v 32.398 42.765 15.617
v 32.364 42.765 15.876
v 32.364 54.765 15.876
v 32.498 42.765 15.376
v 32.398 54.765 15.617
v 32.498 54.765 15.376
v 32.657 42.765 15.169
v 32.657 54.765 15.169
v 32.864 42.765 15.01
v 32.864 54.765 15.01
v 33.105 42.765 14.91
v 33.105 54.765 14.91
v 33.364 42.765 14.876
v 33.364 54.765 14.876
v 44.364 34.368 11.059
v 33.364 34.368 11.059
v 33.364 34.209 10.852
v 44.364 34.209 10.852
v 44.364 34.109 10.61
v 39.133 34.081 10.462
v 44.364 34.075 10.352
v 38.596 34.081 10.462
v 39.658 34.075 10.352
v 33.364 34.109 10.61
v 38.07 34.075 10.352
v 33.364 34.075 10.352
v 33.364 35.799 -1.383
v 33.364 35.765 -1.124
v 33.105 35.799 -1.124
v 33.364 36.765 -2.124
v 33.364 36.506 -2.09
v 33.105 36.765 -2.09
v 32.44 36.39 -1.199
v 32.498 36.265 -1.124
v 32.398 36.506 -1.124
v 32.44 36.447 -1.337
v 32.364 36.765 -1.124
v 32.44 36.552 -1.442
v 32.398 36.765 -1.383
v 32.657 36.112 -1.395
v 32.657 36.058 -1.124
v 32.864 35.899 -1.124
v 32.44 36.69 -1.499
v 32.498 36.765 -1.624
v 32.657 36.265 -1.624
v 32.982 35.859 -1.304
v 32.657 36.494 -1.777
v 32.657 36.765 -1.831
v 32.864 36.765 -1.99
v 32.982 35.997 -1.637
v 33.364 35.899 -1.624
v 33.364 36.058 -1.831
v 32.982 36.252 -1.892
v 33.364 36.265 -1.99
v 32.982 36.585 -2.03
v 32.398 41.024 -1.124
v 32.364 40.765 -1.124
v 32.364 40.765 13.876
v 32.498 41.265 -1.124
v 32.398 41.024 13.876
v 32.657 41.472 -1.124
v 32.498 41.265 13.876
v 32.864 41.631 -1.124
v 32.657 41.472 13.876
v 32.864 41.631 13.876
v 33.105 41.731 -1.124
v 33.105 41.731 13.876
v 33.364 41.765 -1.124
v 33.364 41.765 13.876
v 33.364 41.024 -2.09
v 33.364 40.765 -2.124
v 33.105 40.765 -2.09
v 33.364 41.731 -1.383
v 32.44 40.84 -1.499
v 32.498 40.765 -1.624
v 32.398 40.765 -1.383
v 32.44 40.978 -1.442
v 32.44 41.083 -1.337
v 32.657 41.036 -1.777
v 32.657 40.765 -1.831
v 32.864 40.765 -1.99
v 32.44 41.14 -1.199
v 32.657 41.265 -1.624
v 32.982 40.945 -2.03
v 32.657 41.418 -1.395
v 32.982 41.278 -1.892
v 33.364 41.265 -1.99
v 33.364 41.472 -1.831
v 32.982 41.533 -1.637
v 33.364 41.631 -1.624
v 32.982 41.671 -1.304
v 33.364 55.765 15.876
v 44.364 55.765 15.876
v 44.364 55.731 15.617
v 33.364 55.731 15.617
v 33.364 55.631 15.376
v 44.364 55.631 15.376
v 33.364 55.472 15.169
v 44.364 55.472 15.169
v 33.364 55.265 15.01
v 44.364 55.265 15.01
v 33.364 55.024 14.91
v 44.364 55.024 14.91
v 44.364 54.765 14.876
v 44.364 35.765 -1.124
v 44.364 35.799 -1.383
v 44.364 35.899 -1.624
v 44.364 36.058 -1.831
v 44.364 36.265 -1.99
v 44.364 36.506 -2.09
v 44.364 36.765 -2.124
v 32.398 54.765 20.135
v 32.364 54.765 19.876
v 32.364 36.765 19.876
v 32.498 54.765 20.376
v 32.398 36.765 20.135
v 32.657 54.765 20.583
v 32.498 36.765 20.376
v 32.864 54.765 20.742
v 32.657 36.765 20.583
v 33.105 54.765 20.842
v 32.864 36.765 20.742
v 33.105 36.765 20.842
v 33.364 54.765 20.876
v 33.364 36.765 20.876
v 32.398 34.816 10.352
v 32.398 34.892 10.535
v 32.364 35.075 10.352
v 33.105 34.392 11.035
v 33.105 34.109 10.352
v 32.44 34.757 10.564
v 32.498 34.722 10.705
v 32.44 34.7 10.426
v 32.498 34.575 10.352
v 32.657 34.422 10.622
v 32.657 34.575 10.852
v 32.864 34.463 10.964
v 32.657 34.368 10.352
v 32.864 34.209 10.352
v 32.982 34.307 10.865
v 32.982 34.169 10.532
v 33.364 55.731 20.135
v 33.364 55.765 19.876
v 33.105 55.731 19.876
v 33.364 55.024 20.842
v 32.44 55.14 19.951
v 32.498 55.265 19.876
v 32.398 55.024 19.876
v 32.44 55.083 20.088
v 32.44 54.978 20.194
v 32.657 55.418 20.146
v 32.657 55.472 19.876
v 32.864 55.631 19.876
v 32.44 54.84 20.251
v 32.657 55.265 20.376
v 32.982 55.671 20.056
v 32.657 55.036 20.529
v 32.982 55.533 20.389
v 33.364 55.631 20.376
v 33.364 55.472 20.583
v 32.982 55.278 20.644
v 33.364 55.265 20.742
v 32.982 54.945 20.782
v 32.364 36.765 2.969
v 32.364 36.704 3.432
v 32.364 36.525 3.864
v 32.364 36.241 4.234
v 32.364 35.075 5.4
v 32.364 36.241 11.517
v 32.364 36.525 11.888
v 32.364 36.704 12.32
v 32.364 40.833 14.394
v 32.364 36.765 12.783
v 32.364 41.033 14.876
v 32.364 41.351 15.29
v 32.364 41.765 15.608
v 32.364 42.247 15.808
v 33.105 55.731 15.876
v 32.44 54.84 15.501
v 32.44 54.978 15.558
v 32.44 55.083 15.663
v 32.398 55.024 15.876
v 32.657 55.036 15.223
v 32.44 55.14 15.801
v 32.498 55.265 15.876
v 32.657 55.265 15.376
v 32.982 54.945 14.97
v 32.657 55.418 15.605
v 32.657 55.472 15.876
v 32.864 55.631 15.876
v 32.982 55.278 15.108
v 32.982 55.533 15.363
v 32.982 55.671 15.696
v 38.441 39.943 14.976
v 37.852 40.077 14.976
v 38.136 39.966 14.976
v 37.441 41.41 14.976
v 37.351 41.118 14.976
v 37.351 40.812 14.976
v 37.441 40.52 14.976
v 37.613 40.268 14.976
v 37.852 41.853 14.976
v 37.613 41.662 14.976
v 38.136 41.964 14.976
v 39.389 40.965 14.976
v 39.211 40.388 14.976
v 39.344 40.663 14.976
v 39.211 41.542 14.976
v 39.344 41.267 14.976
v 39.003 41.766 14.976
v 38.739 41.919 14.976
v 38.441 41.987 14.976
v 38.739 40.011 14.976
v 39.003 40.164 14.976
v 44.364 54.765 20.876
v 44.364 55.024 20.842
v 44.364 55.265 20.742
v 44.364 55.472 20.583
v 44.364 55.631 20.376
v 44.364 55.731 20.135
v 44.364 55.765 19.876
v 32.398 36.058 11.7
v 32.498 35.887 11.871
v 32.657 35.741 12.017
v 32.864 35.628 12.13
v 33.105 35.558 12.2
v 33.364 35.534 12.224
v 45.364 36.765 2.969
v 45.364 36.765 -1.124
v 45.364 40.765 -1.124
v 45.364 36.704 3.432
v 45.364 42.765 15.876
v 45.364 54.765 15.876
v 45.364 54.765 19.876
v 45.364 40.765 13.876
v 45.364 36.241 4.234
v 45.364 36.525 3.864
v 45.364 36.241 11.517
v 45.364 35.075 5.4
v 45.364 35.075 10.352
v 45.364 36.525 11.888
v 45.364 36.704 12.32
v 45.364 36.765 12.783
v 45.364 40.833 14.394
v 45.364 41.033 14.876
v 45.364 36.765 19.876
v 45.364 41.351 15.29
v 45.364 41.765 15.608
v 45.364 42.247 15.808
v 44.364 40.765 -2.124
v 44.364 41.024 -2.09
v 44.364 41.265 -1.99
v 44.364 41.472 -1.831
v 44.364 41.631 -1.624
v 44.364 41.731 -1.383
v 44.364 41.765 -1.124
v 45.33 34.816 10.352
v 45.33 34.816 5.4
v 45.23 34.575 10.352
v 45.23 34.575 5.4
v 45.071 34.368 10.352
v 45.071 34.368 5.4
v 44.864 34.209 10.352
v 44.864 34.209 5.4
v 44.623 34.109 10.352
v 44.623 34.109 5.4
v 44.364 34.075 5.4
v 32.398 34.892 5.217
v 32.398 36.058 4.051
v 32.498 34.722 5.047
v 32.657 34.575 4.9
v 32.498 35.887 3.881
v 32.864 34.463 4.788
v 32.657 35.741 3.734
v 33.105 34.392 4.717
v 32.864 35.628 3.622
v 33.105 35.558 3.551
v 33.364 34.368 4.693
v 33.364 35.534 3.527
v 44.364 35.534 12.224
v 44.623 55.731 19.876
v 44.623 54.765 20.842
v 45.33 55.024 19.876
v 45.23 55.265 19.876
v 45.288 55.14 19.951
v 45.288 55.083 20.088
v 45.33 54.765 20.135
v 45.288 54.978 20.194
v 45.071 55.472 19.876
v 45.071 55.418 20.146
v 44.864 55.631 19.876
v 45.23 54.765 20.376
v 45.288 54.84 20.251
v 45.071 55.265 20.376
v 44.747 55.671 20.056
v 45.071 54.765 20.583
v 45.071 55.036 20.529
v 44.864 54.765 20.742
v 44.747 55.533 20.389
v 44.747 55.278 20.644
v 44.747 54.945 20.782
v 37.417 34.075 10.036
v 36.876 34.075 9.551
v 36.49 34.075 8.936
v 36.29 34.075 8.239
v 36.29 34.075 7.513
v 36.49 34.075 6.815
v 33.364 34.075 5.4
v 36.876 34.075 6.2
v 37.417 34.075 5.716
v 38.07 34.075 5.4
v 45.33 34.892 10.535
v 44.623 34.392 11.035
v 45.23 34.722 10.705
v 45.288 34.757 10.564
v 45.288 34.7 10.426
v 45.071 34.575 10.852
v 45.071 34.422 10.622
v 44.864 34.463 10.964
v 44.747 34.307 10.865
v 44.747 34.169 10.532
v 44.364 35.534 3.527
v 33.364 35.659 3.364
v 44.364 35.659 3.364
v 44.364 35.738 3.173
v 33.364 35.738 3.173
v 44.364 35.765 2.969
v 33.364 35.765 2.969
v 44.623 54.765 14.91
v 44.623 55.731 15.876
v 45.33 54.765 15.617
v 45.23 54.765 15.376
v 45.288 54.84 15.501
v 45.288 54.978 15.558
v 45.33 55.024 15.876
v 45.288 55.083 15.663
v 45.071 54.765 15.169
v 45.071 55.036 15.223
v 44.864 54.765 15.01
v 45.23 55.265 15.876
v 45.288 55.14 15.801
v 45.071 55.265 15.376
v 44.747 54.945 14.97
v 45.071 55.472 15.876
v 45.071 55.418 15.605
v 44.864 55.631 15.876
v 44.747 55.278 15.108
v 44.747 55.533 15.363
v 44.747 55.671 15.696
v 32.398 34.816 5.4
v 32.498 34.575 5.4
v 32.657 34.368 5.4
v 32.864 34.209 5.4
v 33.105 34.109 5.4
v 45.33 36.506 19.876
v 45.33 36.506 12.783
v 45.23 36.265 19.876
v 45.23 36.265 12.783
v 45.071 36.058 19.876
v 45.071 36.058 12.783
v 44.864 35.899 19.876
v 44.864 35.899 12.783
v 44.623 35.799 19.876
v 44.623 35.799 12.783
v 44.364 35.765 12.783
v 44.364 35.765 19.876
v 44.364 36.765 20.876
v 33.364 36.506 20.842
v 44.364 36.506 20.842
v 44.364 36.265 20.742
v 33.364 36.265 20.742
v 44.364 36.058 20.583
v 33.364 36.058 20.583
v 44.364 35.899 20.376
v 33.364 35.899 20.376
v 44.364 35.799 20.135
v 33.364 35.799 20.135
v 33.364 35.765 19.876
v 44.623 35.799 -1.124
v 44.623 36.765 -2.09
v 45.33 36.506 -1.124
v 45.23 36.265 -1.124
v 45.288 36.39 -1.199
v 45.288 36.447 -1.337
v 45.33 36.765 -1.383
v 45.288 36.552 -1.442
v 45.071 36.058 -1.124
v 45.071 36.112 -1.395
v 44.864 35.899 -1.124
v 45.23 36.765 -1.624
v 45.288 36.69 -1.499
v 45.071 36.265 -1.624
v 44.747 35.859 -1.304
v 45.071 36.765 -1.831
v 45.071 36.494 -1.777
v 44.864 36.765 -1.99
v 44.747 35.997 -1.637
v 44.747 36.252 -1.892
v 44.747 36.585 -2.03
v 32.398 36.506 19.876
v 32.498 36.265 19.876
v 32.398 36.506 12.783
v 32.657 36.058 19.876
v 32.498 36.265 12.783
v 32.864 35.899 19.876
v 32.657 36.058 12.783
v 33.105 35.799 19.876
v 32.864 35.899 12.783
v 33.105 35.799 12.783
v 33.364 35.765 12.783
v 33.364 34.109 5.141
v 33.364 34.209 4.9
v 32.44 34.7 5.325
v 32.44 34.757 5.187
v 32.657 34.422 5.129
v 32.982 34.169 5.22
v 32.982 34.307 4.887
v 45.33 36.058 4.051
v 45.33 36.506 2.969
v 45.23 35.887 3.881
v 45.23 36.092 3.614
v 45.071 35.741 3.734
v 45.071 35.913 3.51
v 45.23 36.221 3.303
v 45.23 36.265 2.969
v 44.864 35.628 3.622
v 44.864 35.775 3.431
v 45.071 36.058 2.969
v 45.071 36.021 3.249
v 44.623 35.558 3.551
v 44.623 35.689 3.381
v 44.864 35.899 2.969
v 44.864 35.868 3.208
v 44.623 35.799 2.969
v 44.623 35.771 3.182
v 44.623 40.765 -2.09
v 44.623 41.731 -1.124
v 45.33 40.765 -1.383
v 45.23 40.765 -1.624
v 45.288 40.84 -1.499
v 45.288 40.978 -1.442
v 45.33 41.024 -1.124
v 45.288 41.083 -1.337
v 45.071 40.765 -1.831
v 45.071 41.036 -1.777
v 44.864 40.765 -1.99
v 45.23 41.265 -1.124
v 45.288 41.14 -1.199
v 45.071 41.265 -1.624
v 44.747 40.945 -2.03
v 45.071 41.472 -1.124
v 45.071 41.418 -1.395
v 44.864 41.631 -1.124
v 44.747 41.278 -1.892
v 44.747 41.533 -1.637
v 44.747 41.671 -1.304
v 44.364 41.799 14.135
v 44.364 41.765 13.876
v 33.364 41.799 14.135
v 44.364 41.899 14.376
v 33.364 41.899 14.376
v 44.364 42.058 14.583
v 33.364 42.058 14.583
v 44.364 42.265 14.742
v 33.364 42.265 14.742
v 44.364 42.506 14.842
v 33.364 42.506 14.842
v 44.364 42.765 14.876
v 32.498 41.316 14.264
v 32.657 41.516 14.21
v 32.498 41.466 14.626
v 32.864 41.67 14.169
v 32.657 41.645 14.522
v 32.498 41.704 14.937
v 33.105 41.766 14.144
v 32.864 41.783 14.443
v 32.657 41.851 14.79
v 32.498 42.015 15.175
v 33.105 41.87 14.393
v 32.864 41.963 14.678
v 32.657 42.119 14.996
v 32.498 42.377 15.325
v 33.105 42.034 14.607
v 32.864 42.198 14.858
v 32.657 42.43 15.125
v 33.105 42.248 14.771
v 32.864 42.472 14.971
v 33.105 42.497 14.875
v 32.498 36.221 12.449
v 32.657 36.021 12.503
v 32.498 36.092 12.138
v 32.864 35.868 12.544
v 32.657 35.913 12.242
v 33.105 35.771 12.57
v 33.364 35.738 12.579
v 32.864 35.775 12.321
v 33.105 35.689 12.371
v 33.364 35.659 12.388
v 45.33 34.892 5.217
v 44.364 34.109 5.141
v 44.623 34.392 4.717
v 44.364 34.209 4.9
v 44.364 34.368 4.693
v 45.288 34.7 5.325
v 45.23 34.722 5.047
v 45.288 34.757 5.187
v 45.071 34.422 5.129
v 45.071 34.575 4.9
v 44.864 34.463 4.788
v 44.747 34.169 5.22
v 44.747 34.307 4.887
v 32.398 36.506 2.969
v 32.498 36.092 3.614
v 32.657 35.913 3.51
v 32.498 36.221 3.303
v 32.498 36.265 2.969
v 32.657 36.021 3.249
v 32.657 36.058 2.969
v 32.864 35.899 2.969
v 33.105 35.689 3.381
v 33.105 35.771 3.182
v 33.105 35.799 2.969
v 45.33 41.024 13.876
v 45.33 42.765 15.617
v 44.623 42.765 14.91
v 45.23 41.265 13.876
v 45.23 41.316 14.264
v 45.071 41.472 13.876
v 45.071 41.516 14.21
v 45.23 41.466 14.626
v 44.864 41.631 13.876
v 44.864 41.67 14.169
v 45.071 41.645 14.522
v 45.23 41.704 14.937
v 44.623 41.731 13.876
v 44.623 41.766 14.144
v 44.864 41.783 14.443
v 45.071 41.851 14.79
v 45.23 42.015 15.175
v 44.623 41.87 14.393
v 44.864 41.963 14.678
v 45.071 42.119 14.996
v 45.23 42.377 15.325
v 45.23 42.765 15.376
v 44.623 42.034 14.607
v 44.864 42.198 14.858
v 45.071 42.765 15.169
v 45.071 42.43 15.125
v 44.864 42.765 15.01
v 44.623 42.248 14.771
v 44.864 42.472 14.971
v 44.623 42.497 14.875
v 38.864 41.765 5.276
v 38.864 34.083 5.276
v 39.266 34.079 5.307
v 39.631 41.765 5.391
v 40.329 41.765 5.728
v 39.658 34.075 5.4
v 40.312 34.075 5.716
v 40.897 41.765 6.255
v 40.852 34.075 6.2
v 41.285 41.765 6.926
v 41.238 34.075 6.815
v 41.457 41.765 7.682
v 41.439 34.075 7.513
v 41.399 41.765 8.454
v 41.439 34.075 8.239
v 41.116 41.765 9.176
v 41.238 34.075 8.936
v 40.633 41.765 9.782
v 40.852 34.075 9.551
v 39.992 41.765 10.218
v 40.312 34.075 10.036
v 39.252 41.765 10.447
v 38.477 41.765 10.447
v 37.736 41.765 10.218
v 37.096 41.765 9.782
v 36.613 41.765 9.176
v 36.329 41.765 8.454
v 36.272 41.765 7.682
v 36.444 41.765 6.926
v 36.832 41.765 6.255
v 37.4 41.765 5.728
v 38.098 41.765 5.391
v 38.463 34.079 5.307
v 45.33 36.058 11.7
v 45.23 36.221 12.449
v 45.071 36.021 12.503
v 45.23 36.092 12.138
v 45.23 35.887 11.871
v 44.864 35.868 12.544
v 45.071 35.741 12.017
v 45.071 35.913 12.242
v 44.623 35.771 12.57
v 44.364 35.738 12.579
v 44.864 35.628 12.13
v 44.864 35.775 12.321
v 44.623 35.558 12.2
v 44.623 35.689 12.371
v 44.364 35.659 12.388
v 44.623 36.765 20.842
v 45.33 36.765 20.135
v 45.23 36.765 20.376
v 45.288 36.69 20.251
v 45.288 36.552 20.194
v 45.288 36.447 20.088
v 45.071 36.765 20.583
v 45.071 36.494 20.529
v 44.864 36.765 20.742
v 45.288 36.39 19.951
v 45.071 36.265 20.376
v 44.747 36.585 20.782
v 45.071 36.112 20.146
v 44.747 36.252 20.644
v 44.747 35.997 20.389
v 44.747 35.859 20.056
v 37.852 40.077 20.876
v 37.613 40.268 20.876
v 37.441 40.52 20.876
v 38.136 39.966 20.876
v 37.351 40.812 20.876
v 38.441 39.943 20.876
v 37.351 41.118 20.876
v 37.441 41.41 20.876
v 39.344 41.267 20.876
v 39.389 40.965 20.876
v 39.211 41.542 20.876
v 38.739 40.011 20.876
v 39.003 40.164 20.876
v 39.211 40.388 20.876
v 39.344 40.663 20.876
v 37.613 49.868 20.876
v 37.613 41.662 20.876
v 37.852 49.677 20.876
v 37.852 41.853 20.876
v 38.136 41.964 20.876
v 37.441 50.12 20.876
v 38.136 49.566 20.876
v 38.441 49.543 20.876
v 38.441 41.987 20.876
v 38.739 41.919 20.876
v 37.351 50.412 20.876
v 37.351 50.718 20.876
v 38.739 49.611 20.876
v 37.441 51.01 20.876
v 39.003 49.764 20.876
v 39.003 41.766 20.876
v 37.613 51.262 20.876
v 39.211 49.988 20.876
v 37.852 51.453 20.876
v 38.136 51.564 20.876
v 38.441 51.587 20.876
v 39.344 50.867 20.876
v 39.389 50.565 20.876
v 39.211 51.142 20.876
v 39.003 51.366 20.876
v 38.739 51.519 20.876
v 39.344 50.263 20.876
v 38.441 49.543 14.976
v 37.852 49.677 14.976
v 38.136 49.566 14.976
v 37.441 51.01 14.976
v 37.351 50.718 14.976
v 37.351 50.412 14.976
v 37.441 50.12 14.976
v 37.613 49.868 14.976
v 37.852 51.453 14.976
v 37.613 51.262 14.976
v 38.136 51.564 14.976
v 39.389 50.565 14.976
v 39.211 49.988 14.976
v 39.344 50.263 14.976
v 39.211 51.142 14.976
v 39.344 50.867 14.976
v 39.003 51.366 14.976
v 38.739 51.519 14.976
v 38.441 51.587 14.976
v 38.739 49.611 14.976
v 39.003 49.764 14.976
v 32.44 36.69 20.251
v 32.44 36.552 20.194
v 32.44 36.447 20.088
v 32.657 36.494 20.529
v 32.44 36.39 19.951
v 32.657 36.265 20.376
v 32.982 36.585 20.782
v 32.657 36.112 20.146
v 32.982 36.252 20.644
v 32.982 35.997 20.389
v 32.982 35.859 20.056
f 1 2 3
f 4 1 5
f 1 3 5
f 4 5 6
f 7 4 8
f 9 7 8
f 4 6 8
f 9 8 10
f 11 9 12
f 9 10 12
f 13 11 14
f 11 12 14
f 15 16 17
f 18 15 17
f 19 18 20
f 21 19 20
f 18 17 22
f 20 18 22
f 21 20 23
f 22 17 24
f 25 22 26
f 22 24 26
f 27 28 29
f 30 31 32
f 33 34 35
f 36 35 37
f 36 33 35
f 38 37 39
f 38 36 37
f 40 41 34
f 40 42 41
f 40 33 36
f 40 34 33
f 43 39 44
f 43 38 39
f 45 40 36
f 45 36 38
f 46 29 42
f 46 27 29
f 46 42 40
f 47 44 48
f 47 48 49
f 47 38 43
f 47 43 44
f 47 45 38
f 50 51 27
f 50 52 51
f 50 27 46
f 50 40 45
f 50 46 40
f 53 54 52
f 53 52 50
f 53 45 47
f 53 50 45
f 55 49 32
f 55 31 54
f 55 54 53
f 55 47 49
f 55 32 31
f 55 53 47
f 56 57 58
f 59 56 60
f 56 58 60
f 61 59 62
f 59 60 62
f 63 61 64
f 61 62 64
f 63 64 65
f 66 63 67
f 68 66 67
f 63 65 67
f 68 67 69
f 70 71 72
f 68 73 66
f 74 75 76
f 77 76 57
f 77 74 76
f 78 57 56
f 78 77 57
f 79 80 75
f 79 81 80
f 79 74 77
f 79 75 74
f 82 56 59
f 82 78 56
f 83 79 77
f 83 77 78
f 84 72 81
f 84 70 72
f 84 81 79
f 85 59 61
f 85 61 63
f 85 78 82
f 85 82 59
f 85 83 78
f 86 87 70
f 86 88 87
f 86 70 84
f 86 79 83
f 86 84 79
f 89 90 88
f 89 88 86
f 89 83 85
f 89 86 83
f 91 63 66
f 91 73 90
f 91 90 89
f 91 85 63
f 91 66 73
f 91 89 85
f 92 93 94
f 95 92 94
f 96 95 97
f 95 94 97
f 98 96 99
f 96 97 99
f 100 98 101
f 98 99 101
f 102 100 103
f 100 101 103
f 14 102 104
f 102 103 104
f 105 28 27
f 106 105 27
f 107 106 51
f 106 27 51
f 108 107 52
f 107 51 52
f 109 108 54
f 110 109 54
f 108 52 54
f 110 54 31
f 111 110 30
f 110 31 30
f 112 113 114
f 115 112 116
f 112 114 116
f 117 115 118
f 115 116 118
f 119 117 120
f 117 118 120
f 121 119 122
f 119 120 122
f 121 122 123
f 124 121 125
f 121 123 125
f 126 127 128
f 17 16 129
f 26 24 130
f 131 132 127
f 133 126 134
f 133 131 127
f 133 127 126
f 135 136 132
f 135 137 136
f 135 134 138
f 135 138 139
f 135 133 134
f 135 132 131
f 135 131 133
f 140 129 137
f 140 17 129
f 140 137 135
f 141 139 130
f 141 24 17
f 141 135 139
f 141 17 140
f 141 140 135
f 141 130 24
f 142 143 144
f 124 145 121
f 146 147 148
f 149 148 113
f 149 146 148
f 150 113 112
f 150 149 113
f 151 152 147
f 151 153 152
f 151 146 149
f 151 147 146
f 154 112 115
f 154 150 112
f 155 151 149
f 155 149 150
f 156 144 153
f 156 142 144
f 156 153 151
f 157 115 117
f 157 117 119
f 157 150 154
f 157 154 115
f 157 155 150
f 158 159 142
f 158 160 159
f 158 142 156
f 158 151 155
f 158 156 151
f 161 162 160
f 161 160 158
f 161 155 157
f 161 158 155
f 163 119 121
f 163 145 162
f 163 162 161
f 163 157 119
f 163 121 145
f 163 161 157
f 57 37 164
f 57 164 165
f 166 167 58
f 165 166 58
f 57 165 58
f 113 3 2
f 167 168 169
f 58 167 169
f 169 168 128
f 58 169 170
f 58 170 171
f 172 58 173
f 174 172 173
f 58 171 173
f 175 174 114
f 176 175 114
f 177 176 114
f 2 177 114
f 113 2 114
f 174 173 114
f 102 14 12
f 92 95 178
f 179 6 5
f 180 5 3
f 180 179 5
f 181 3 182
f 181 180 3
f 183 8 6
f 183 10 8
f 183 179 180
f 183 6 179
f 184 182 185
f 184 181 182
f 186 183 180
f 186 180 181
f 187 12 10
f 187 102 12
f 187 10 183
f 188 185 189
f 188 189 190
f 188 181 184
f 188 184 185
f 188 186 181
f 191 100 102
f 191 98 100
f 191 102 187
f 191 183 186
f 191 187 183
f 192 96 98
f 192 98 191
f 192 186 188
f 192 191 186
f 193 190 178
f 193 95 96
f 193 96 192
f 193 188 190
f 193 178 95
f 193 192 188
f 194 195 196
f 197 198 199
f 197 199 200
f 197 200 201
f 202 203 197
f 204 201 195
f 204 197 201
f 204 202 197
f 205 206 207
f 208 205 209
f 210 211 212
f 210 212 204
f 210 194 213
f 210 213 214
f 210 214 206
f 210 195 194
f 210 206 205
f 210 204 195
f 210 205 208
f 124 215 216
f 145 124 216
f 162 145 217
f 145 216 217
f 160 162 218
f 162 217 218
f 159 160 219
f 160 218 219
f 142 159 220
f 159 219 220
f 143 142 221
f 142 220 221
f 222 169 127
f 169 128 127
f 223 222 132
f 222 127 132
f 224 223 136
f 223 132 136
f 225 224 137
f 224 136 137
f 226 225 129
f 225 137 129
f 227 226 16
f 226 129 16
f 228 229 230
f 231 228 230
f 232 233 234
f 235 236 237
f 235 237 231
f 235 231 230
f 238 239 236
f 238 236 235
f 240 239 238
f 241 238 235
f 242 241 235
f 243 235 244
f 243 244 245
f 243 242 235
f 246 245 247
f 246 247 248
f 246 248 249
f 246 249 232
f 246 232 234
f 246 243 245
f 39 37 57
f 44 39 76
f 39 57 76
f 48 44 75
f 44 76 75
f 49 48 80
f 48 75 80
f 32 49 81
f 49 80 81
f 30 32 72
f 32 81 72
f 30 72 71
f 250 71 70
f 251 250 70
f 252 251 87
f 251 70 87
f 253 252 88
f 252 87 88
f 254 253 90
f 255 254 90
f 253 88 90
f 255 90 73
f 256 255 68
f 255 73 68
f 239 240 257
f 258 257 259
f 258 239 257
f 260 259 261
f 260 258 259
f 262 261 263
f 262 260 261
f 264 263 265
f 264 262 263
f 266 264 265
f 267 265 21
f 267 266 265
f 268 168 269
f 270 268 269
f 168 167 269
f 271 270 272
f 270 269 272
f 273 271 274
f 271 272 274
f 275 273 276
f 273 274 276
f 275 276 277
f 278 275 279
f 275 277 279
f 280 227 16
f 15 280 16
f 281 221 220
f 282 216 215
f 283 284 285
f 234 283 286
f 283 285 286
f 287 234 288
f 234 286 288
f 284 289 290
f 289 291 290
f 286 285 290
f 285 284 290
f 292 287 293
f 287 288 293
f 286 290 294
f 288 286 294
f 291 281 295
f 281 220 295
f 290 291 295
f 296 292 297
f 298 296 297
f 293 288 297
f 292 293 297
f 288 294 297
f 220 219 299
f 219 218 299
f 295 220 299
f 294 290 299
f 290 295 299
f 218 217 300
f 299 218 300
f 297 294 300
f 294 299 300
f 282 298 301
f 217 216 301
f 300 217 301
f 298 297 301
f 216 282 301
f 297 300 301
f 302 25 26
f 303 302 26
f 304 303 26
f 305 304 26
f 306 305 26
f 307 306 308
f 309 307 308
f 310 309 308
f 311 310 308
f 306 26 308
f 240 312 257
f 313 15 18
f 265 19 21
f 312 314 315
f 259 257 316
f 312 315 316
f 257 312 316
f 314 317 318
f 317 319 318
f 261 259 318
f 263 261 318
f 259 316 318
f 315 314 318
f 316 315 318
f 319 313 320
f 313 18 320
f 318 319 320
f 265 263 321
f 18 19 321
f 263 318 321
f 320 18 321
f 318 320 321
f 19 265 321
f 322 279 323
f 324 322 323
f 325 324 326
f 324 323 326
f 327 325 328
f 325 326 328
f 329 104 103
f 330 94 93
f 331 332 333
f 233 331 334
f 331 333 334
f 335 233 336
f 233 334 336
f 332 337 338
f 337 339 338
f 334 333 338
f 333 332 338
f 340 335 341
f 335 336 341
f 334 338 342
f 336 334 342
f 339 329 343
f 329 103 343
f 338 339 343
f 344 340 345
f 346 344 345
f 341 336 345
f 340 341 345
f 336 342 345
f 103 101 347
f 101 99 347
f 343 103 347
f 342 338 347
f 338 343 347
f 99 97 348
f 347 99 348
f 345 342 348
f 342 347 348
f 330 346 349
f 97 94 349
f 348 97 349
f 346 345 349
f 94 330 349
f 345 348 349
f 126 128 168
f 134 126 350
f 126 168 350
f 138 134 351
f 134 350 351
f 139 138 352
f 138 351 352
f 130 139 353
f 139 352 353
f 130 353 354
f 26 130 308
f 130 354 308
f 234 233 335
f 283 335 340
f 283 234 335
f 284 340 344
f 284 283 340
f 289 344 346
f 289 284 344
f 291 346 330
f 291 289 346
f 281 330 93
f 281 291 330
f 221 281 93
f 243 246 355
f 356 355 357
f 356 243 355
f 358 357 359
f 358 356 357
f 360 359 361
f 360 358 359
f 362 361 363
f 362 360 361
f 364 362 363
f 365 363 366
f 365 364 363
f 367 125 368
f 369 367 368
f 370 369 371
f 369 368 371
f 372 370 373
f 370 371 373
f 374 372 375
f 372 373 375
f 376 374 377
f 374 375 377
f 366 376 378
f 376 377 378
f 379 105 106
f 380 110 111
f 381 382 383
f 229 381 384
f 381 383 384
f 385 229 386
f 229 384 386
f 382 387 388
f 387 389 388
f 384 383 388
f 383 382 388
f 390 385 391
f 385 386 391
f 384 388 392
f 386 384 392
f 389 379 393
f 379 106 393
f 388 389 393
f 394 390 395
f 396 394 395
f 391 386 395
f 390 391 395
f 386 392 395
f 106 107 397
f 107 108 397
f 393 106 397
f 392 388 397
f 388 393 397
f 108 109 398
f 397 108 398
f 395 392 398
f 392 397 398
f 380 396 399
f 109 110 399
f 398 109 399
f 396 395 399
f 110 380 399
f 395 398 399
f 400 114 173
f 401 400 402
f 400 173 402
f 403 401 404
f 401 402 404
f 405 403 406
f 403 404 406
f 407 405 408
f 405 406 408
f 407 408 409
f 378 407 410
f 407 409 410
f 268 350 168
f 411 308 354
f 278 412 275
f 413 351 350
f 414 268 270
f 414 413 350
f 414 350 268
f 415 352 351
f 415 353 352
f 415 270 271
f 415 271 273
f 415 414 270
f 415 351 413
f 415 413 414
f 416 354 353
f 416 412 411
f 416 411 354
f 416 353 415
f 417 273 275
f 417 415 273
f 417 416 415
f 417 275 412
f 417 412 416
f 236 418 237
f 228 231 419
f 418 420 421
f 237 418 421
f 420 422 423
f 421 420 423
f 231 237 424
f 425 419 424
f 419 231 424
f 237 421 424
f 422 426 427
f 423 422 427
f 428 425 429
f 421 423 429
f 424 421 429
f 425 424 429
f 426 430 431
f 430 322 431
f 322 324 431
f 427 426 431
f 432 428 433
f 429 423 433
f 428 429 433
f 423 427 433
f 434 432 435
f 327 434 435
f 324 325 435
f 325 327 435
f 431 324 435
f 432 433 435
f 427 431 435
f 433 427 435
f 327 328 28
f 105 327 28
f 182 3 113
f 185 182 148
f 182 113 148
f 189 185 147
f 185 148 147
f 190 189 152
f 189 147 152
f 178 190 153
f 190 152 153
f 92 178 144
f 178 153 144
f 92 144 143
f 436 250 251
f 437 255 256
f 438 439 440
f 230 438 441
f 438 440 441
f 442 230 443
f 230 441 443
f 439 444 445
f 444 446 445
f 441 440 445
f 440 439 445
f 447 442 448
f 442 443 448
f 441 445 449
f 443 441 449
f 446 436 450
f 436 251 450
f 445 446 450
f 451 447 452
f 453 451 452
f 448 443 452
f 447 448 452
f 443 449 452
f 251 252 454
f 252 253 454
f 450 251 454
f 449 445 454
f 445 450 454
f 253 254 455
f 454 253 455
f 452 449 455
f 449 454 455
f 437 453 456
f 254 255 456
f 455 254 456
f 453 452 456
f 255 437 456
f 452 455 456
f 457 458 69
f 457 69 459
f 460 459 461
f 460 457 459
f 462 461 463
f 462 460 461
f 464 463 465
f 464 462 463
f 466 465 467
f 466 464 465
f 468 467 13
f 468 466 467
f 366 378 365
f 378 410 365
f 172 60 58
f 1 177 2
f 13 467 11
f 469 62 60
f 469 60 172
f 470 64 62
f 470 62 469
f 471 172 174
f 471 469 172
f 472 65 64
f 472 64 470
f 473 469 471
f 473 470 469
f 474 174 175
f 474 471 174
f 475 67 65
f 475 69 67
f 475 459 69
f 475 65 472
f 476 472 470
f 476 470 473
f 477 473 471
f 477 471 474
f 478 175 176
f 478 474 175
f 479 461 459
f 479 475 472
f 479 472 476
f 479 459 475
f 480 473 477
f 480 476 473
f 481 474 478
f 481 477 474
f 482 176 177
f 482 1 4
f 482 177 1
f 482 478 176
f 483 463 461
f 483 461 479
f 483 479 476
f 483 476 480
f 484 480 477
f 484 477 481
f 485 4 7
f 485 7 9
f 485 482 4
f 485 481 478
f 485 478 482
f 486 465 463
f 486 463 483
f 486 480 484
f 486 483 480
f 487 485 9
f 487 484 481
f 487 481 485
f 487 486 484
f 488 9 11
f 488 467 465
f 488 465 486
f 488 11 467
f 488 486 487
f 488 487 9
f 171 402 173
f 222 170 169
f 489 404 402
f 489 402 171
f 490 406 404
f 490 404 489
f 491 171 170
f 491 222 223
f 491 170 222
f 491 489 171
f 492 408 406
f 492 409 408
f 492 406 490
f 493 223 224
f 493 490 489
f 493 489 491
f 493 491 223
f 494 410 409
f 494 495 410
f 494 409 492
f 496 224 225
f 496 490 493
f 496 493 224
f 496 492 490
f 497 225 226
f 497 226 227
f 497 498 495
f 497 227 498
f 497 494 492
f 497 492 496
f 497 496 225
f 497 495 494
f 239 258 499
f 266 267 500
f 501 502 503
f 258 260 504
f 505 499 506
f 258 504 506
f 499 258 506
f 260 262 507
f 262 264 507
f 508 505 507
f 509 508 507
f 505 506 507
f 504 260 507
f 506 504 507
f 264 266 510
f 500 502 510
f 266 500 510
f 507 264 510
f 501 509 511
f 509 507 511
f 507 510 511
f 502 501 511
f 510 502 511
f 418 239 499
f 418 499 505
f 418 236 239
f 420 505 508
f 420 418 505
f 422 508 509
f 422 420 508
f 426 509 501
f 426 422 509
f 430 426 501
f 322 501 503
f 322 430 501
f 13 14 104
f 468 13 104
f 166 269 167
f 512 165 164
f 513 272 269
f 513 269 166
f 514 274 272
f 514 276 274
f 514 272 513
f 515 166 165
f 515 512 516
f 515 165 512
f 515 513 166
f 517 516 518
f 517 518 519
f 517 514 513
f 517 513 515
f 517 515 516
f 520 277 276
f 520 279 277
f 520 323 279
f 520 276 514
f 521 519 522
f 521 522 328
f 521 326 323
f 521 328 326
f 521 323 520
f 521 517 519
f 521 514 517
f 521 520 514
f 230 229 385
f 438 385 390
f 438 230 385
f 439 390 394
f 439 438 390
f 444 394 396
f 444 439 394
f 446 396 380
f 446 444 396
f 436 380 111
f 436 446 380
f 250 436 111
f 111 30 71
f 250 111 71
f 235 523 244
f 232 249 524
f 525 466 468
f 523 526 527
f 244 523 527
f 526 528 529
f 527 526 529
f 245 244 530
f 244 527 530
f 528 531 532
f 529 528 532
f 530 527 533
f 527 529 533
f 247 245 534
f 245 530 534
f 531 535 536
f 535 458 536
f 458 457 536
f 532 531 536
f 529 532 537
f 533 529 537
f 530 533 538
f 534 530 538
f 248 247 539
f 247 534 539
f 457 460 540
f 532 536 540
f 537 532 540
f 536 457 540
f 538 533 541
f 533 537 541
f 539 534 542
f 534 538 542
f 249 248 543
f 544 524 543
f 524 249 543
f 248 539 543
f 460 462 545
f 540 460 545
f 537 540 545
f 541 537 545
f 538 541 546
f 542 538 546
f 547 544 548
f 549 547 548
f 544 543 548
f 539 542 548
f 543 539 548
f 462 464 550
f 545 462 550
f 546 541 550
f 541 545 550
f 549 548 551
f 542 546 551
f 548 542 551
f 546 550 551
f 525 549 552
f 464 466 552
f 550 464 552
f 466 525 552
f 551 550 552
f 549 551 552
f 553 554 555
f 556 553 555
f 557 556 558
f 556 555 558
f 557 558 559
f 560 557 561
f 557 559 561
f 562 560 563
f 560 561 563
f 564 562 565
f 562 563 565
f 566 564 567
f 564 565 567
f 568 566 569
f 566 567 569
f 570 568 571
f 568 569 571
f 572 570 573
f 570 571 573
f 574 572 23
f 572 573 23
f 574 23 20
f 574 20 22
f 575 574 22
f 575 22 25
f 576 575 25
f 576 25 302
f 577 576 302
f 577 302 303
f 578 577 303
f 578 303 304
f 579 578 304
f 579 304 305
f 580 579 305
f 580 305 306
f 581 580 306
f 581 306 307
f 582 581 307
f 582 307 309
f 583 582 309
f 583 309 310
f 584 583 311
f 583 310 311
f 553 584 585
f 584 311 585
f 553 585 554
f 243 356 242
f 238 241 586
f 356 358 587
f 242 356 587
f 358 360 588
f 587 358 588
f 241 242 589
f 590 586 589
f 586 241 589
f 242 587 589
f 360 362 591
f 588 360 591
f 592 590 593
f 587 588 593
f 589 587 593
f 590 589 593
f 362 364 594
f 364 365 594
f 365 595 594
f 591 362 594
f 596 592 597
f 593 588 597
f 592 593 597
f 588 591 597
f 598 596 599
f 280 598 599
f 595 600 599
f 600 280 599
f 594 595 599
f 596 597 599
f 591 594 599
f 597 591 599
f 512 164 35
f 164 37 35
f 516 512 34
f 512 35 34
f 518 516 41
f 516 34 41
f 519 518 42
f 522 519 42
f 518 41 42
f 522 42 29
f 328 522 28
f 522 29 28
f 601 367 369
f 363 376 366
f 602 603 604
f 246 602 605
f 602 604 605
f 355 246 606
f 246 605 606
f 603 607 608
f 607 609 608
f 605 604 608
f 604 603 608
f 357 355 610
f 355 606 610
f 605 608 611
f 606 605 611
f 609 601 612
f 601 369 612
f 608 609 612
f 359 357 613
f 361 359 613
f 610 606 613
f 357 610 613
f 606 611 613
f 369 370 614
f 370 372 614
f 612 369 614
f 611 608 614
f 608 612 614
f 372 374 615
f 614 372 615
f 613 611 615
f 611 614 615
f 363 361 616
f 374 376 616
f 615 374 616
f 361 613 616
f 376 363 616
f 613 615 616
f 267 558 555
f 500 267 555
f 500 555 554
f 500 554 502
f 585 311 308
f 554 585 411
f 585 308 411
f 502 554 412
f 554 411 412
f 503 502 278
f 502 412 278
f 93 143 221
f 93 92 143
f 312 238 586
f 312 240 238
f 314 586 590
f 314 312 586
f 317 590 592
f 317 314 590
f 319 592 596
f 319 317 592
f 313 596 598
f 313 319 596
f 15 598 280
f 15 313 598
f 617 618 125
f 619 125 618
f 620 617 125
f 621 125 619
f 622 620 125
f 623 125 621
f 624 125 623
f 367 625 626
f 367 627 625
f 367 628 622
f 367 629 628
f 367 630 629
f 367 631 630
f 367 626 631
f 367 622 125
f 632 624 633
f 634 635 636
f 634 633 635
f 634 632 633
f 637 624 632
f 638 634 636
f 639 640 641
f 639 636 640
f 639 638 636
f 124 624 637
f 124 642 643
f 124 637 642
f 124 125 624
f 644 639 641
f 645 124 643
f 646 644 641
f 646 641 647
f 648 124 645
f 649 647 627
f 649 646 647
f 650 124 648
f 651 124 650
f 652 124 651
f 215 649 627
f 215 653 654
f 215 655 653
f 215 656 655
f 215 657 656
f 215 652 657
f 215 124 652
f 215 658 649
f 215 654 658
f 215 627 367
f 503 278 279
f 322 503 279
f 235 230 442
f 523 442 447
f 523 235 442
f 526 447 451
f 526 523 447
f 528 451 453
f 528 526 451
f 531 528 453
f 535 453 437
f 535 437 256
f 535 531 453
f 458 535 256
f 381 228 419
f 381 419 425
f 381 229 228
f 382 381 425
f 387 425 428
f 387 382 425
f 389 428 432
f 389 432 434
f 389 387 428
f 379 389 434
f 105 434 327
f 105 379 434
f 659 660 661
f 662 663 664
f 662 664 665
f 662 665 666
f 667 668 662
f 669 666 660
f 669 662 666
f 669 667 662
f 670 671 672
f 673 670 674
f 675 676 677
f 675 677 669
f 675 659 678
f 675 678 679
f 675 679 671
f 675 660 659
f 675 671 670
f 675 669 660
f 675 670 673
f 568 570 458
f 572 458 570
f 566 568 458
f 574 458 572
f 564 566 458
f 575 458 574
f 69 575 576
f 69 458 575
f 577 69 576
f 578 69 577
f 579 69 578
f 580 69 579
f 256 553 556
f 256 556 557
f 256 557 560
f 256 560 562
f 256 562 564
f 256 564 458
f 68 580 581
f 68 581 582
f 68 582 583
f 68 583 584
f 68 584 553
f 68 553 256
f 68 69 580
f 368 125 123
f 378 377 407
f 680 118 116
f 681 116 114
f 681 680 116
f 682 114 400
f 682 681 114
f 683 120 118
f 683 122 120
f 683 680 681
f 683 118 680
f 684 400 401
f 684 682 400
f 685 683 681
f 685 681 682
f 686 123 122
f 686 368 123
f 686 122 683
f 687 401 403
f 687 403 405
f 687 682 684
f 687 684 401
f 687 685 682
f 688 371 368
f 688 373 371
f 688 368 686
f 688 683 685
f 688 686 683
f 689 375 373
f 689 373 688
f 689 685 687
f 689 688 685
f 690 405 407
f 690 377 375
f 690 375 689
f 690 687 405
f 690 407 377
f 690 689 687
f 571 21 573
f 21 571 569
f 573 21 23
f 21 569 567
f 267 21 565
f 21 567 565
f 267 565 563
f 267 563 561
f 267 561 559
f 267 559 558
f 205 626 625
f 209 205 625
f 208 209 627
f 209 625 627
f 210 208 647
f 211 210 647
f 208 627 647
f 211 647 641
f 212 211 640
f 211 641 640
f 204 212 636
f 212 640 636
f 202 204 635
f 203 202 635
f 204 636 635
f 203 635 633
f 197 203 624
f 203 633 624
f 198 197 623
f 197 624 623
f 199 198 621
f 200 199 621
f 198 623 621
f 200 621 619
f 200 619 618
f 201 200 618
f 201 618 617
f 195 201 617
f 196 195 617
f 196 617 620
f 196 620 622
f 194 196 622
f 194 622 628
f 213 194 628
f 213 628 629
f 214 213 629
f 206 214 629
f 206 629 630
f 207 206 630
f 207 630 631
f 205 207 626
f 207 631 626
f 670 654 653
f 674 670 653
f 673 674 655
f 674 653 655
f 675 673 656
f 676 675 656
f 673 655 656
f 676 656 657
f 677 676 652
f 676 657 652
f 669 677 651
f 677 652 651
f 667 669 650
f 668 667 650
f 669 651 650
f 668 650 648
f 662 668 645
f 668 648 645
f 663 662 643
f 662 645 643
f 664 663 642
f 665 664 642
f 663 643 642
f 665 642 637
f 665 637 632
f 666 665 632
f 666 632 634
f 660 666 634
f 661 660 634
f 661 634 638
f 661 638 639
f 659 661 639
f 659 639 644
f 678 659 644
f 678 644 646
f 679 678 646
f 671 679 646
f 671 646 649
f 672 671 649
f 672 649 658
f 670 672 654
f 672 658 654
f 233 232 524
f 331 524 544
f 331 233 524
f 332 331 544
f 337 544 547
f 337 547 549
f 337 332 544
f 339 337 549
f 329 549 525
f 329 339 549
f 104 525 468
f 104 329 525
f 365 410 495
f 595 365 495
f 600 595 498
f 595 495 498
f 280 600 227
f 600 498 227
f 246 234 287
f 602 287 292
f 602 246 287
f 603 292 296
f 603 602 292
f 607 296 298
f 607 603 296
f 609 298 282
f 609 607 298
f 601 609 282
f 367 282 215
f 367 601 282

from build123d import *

# Parameters (mm, degrees)
SKETCH1_W                = 20
SKETCH1_H                = 6
BOSS_EXTRUDE1_DEPTH      = 13
CUT_EXTRUDE1_REACH       = 51.362
SKETCH2_R                = 2.6
BOSS_EXTRUDE2_DEPTH      = 3
BOSS_EXTRUDE2_DEPTH_BACK = 3
SKETCH3_W                = 13
SKETCH3_H                = 20
SKETCH4_R                = 1.025
CUT_EXTRUDE2_DEPTH       = 5.9
FILLET1_R                = 1
FILLET2_R                = 1


with BuildPart() as part:
    # Sketch1 → Boss-Extrude1 (new body)
    with BuildSketch(Plane(origin=(32.364284334, 0, 0), x_dir=(0, 0, -1), z_dir=(1, 0, 0))):
        with Locations((-7.875866483, 38.765059464)):
            Rectangle(SKETCH1_W, SKETCH1_H)
        with BuildLine():
            Line((-12.22448084, 35.533673821), (-10.765866483, 34.075059464))
            Line((-10.765866483, 34.075059464), (-4.985866483, 34.075059464))
            Line((-4.985866483, 34.075059464), (-3.527252126, 35.533673821))
            ThreePointArc((-3.527252126, 35.533673821), (-3.27095768, 35.704924294), (-2.968637768, 35.765059464))
            Line((-2.968637768, 35.765059464), (-12.783095197, 35.765059464))
            ThreePointArc((-12.783095197, 35.765059464), (-12.480775285, 35.704924294), (-12.22448084, 35.533673821))
        make_face()
    extrude(amount=BOSS_EXTRUDE1_DEPTH)

    # Sketch2 → Cut-Extrude1 (cut, up to next)
    with BuildSketch(Plane.XZ.offset(-34.075059464), mode=Mode.PRIVATE) as cut_extrude1_sk1:
        with Locations(Location((38.864284334, 7.875866483, 0), (0, 0, 270))):
            Circle(SKETCH2_R)
    cut_extrude1_tool1 = extrude(cut_extrude1_sk1.sketch, amount=-CUT_EXTRUDE1_REACH, mode=Mode.PRIVATE) & part.part
    add(cut_extrude1_tool1.solids().sort_by_distance((38.864284, 34.075059, 7.875866))[0], mode=Mode.SUBTRACT)

    # Sketch3 → Boss-Extrude2 (add, two sides: drawn at the far end of the back side and taken through both)
    with BuildSketch(Plane.XY.offset(17.875866483).offset(-BOSS_EXTRUDE2_DEPTH_BACK)):
        with Locations((38.864284334, 45.765059464)):
            Rectangle(SKETCH3_W, SKETCH3_H)
    extrude(amount=BOSS_EXTRUDE2_DEPTH + BOSS_EXTRUDE2_DEPTH_BACK)

    # Sketch4 → Cut-Extrude2 (cut)
    with BuildSketch(Plane.XY.offset(20.875866483)):
        with Locations((38.364284334, 50.565059464)):
            Circle(SKETCH4_R)
        with Locations((38.364284334, 40.965059464)):
            Circle(SKETCH4_R)
    extrude(amount=-CUT_EXTRUDE2_DEPTH, mode=Mode.SUBTRACT)

    # Fillet1
    # the kernel refuses this fillet: 1 mm, written as the material it adds along each edge
    with BuildSketch(Plane(origin=(45.364284334, 41.765059464, 14.875866483), x_dir=(0, 0, -1), z_dir=(-1, 0, 0))) as fillet1_piece_1:
        with BuildLine():
            CenterArc((FILLET1_R, -FILLET1_R), FILLET1_R, 90, 90)
            Line((0, -FILLET1_R), (0, 0))
            Line((0, 0), (FILLET1_R, 0))
        make_face()
    extrude(amount=13)
    # the kernel refuses this fillet: 1 mm, written as the material it takes off along each edge
    with BuildSketch(Plane(origin=(47.864284334, 55.765059464, 14.875866483), x_dir=(0, -1, 0), z_dir=(-1, 0, 0)), Plane(origin=(29.864284334, 35.765059464, 20.875866483), x_dir=(0, 0, -1), z_dir=(1, 0, 0))) as fillet1_2_piece_1:
        with BuildLine():
            CenterArc((FILLET1_R, FILLET1_R), FILLET1_R, 180, 90)
            Line((0, FILLET1_R), (0, 0))
            Line((0, 0), (FILLET1_R, 0))
        make_face()
    extrude(amount=18, mode=Mode.SUBTRACT)
    with BuildSketch(Plane(origin=(47.864284334, 55.765059464, 20.875866483), x_dir=(0, -1, 0), z_dir=(-1, 0, 0)), Plane(origin=(29.864284334, 41.765059464, -2.124133517), x_dir=(0, -1, 0), z_dir=(1, 0, 0)), Plane(origin=(29.864284334, 35.765059464, -2.124133517), x_dir=(0, 0, 1), z_dir=(1, 0, 0))) as fillet1_2_piece_2:
        with BuildLine():
            CenterArc((FILLET1_R, -FILLET1_R), FILLET1_R, 90, 90)
            Line((0, -FILLET1_R), (0, 0))
            Line((0, 0), (FILLET1_R, 0))
        make_face()
    extrude(amount=18, mode=Mode.SUBTRACT)
    with BuildSketch(Plane(origin=(31.328750428, 34.075059464, 4.985866483), x_dir=(0, 0, 1), z_dir=(1, 0, 0)), Plane(origin=(31.328750428, 34.075059464, 10.765866483), x_dir=(0, 0.7071067811865432, 0.7071067811865518), z_dir=(1, 0, 0))) as fillet1_2_piece_3:
        with BuildLine():
            CenterArc((FILLET1_R * 0.414213562373, -FILLET1_R), FILLET1_R, 90, 45)
            Line((-FILLET1_R * 0.292893218813, -FILLET1_R * 0.292893218813), (0, 0))
            Line((0, 0), (FILLET1_R * 0.414213562373, 0))
        make_face()
    extrude(amount=15.071067812, mode=Mode.SUBTRACT)

    # Fillet2
    fillet2_edges = [part.edges().sort_by_distance(p)[0] for p in [
        (45.364284334, 35.704924294, 12.480775285),
        (32.364284334, 35.765059464, 0.922252126),
        (32.364284334, 35.704924294, 3.27095768),
        (32.364284334, 34.950813252, 4.110112695),
        (32.364284334, 35.704924294, 12.480775285),
        (32.364284334, 48.765059464, 14.875866483),
        (32.364284334, 41.765059464, 6.375866483),
        (32.364284334, 38.765059464, -2.124133517),
        (32.364284334, 34.075059464, 7.875866483),
        (32.364284334, 34.950813252, 11.641620271),
        (32.364284334, 35.765059464, 16.32948084),
        (32.364284334, 45.765059464, 20.875866483),
        (32.364284334, 55.765059464, 17.875866483),
        (32.364284334, 36.057952683, 20.582973264),
        (32.364284334, 55.472166245, 15.168759702),
        (32.364284334, 41.472166245, -1.831240298),
        (32.364284334, 55.472166245, 20.582973264),
        (32.364284334, 36.057952683, -1.831240298),
        (32.364284334, 34.151179931, 10.734336353),
        (32.364284334, 34.151179931, 5.017396613),
        (45.364284334, 34.075059464, 7.875866483),
        (45.364284334, 41.765059464, 6.375866483),
        (45.364284334, 48.765059464, 14.875866483),
        (45.364284334, 55.765059464, 17.875866483),
        (45.364284334, 45.765059464, 20.875866483),
        (45.364284334, 35.765059464, 16.32948084),
        (45.364284334, 34.950813252, 11.641620271),
        (45.364284334, 38.765059464, -2.124133517),
        (45.364284334, 36.057952683, 20.582973264),
        (45.364284334, 55.472166245, 15.168759702),
        (45.364284334, 41.472166245, -1.831240298),
        (45.364284334, 55.472166245, 20.582973264),
        (45.364284334, 36.057952683, -1.831240298),
        (45.364284334, 34.151179931, 10.734336353),
        (45.364284334, 34.151179931, 5.017396613),
        (32.364284334, 42.057952683, 14.582973264),
        (45.364284334, 42.057952683, 14.582973264),
        (45.364284334, 34.950813252, 4.110112695),
        (45.364284334, 35.704924294, 3.27095768),
        (45.364284334, 35.765059464, 0.922252126),
    ]]
    fillet(fillet2_edges, radius=FILLET2_R)


solid = part.part
